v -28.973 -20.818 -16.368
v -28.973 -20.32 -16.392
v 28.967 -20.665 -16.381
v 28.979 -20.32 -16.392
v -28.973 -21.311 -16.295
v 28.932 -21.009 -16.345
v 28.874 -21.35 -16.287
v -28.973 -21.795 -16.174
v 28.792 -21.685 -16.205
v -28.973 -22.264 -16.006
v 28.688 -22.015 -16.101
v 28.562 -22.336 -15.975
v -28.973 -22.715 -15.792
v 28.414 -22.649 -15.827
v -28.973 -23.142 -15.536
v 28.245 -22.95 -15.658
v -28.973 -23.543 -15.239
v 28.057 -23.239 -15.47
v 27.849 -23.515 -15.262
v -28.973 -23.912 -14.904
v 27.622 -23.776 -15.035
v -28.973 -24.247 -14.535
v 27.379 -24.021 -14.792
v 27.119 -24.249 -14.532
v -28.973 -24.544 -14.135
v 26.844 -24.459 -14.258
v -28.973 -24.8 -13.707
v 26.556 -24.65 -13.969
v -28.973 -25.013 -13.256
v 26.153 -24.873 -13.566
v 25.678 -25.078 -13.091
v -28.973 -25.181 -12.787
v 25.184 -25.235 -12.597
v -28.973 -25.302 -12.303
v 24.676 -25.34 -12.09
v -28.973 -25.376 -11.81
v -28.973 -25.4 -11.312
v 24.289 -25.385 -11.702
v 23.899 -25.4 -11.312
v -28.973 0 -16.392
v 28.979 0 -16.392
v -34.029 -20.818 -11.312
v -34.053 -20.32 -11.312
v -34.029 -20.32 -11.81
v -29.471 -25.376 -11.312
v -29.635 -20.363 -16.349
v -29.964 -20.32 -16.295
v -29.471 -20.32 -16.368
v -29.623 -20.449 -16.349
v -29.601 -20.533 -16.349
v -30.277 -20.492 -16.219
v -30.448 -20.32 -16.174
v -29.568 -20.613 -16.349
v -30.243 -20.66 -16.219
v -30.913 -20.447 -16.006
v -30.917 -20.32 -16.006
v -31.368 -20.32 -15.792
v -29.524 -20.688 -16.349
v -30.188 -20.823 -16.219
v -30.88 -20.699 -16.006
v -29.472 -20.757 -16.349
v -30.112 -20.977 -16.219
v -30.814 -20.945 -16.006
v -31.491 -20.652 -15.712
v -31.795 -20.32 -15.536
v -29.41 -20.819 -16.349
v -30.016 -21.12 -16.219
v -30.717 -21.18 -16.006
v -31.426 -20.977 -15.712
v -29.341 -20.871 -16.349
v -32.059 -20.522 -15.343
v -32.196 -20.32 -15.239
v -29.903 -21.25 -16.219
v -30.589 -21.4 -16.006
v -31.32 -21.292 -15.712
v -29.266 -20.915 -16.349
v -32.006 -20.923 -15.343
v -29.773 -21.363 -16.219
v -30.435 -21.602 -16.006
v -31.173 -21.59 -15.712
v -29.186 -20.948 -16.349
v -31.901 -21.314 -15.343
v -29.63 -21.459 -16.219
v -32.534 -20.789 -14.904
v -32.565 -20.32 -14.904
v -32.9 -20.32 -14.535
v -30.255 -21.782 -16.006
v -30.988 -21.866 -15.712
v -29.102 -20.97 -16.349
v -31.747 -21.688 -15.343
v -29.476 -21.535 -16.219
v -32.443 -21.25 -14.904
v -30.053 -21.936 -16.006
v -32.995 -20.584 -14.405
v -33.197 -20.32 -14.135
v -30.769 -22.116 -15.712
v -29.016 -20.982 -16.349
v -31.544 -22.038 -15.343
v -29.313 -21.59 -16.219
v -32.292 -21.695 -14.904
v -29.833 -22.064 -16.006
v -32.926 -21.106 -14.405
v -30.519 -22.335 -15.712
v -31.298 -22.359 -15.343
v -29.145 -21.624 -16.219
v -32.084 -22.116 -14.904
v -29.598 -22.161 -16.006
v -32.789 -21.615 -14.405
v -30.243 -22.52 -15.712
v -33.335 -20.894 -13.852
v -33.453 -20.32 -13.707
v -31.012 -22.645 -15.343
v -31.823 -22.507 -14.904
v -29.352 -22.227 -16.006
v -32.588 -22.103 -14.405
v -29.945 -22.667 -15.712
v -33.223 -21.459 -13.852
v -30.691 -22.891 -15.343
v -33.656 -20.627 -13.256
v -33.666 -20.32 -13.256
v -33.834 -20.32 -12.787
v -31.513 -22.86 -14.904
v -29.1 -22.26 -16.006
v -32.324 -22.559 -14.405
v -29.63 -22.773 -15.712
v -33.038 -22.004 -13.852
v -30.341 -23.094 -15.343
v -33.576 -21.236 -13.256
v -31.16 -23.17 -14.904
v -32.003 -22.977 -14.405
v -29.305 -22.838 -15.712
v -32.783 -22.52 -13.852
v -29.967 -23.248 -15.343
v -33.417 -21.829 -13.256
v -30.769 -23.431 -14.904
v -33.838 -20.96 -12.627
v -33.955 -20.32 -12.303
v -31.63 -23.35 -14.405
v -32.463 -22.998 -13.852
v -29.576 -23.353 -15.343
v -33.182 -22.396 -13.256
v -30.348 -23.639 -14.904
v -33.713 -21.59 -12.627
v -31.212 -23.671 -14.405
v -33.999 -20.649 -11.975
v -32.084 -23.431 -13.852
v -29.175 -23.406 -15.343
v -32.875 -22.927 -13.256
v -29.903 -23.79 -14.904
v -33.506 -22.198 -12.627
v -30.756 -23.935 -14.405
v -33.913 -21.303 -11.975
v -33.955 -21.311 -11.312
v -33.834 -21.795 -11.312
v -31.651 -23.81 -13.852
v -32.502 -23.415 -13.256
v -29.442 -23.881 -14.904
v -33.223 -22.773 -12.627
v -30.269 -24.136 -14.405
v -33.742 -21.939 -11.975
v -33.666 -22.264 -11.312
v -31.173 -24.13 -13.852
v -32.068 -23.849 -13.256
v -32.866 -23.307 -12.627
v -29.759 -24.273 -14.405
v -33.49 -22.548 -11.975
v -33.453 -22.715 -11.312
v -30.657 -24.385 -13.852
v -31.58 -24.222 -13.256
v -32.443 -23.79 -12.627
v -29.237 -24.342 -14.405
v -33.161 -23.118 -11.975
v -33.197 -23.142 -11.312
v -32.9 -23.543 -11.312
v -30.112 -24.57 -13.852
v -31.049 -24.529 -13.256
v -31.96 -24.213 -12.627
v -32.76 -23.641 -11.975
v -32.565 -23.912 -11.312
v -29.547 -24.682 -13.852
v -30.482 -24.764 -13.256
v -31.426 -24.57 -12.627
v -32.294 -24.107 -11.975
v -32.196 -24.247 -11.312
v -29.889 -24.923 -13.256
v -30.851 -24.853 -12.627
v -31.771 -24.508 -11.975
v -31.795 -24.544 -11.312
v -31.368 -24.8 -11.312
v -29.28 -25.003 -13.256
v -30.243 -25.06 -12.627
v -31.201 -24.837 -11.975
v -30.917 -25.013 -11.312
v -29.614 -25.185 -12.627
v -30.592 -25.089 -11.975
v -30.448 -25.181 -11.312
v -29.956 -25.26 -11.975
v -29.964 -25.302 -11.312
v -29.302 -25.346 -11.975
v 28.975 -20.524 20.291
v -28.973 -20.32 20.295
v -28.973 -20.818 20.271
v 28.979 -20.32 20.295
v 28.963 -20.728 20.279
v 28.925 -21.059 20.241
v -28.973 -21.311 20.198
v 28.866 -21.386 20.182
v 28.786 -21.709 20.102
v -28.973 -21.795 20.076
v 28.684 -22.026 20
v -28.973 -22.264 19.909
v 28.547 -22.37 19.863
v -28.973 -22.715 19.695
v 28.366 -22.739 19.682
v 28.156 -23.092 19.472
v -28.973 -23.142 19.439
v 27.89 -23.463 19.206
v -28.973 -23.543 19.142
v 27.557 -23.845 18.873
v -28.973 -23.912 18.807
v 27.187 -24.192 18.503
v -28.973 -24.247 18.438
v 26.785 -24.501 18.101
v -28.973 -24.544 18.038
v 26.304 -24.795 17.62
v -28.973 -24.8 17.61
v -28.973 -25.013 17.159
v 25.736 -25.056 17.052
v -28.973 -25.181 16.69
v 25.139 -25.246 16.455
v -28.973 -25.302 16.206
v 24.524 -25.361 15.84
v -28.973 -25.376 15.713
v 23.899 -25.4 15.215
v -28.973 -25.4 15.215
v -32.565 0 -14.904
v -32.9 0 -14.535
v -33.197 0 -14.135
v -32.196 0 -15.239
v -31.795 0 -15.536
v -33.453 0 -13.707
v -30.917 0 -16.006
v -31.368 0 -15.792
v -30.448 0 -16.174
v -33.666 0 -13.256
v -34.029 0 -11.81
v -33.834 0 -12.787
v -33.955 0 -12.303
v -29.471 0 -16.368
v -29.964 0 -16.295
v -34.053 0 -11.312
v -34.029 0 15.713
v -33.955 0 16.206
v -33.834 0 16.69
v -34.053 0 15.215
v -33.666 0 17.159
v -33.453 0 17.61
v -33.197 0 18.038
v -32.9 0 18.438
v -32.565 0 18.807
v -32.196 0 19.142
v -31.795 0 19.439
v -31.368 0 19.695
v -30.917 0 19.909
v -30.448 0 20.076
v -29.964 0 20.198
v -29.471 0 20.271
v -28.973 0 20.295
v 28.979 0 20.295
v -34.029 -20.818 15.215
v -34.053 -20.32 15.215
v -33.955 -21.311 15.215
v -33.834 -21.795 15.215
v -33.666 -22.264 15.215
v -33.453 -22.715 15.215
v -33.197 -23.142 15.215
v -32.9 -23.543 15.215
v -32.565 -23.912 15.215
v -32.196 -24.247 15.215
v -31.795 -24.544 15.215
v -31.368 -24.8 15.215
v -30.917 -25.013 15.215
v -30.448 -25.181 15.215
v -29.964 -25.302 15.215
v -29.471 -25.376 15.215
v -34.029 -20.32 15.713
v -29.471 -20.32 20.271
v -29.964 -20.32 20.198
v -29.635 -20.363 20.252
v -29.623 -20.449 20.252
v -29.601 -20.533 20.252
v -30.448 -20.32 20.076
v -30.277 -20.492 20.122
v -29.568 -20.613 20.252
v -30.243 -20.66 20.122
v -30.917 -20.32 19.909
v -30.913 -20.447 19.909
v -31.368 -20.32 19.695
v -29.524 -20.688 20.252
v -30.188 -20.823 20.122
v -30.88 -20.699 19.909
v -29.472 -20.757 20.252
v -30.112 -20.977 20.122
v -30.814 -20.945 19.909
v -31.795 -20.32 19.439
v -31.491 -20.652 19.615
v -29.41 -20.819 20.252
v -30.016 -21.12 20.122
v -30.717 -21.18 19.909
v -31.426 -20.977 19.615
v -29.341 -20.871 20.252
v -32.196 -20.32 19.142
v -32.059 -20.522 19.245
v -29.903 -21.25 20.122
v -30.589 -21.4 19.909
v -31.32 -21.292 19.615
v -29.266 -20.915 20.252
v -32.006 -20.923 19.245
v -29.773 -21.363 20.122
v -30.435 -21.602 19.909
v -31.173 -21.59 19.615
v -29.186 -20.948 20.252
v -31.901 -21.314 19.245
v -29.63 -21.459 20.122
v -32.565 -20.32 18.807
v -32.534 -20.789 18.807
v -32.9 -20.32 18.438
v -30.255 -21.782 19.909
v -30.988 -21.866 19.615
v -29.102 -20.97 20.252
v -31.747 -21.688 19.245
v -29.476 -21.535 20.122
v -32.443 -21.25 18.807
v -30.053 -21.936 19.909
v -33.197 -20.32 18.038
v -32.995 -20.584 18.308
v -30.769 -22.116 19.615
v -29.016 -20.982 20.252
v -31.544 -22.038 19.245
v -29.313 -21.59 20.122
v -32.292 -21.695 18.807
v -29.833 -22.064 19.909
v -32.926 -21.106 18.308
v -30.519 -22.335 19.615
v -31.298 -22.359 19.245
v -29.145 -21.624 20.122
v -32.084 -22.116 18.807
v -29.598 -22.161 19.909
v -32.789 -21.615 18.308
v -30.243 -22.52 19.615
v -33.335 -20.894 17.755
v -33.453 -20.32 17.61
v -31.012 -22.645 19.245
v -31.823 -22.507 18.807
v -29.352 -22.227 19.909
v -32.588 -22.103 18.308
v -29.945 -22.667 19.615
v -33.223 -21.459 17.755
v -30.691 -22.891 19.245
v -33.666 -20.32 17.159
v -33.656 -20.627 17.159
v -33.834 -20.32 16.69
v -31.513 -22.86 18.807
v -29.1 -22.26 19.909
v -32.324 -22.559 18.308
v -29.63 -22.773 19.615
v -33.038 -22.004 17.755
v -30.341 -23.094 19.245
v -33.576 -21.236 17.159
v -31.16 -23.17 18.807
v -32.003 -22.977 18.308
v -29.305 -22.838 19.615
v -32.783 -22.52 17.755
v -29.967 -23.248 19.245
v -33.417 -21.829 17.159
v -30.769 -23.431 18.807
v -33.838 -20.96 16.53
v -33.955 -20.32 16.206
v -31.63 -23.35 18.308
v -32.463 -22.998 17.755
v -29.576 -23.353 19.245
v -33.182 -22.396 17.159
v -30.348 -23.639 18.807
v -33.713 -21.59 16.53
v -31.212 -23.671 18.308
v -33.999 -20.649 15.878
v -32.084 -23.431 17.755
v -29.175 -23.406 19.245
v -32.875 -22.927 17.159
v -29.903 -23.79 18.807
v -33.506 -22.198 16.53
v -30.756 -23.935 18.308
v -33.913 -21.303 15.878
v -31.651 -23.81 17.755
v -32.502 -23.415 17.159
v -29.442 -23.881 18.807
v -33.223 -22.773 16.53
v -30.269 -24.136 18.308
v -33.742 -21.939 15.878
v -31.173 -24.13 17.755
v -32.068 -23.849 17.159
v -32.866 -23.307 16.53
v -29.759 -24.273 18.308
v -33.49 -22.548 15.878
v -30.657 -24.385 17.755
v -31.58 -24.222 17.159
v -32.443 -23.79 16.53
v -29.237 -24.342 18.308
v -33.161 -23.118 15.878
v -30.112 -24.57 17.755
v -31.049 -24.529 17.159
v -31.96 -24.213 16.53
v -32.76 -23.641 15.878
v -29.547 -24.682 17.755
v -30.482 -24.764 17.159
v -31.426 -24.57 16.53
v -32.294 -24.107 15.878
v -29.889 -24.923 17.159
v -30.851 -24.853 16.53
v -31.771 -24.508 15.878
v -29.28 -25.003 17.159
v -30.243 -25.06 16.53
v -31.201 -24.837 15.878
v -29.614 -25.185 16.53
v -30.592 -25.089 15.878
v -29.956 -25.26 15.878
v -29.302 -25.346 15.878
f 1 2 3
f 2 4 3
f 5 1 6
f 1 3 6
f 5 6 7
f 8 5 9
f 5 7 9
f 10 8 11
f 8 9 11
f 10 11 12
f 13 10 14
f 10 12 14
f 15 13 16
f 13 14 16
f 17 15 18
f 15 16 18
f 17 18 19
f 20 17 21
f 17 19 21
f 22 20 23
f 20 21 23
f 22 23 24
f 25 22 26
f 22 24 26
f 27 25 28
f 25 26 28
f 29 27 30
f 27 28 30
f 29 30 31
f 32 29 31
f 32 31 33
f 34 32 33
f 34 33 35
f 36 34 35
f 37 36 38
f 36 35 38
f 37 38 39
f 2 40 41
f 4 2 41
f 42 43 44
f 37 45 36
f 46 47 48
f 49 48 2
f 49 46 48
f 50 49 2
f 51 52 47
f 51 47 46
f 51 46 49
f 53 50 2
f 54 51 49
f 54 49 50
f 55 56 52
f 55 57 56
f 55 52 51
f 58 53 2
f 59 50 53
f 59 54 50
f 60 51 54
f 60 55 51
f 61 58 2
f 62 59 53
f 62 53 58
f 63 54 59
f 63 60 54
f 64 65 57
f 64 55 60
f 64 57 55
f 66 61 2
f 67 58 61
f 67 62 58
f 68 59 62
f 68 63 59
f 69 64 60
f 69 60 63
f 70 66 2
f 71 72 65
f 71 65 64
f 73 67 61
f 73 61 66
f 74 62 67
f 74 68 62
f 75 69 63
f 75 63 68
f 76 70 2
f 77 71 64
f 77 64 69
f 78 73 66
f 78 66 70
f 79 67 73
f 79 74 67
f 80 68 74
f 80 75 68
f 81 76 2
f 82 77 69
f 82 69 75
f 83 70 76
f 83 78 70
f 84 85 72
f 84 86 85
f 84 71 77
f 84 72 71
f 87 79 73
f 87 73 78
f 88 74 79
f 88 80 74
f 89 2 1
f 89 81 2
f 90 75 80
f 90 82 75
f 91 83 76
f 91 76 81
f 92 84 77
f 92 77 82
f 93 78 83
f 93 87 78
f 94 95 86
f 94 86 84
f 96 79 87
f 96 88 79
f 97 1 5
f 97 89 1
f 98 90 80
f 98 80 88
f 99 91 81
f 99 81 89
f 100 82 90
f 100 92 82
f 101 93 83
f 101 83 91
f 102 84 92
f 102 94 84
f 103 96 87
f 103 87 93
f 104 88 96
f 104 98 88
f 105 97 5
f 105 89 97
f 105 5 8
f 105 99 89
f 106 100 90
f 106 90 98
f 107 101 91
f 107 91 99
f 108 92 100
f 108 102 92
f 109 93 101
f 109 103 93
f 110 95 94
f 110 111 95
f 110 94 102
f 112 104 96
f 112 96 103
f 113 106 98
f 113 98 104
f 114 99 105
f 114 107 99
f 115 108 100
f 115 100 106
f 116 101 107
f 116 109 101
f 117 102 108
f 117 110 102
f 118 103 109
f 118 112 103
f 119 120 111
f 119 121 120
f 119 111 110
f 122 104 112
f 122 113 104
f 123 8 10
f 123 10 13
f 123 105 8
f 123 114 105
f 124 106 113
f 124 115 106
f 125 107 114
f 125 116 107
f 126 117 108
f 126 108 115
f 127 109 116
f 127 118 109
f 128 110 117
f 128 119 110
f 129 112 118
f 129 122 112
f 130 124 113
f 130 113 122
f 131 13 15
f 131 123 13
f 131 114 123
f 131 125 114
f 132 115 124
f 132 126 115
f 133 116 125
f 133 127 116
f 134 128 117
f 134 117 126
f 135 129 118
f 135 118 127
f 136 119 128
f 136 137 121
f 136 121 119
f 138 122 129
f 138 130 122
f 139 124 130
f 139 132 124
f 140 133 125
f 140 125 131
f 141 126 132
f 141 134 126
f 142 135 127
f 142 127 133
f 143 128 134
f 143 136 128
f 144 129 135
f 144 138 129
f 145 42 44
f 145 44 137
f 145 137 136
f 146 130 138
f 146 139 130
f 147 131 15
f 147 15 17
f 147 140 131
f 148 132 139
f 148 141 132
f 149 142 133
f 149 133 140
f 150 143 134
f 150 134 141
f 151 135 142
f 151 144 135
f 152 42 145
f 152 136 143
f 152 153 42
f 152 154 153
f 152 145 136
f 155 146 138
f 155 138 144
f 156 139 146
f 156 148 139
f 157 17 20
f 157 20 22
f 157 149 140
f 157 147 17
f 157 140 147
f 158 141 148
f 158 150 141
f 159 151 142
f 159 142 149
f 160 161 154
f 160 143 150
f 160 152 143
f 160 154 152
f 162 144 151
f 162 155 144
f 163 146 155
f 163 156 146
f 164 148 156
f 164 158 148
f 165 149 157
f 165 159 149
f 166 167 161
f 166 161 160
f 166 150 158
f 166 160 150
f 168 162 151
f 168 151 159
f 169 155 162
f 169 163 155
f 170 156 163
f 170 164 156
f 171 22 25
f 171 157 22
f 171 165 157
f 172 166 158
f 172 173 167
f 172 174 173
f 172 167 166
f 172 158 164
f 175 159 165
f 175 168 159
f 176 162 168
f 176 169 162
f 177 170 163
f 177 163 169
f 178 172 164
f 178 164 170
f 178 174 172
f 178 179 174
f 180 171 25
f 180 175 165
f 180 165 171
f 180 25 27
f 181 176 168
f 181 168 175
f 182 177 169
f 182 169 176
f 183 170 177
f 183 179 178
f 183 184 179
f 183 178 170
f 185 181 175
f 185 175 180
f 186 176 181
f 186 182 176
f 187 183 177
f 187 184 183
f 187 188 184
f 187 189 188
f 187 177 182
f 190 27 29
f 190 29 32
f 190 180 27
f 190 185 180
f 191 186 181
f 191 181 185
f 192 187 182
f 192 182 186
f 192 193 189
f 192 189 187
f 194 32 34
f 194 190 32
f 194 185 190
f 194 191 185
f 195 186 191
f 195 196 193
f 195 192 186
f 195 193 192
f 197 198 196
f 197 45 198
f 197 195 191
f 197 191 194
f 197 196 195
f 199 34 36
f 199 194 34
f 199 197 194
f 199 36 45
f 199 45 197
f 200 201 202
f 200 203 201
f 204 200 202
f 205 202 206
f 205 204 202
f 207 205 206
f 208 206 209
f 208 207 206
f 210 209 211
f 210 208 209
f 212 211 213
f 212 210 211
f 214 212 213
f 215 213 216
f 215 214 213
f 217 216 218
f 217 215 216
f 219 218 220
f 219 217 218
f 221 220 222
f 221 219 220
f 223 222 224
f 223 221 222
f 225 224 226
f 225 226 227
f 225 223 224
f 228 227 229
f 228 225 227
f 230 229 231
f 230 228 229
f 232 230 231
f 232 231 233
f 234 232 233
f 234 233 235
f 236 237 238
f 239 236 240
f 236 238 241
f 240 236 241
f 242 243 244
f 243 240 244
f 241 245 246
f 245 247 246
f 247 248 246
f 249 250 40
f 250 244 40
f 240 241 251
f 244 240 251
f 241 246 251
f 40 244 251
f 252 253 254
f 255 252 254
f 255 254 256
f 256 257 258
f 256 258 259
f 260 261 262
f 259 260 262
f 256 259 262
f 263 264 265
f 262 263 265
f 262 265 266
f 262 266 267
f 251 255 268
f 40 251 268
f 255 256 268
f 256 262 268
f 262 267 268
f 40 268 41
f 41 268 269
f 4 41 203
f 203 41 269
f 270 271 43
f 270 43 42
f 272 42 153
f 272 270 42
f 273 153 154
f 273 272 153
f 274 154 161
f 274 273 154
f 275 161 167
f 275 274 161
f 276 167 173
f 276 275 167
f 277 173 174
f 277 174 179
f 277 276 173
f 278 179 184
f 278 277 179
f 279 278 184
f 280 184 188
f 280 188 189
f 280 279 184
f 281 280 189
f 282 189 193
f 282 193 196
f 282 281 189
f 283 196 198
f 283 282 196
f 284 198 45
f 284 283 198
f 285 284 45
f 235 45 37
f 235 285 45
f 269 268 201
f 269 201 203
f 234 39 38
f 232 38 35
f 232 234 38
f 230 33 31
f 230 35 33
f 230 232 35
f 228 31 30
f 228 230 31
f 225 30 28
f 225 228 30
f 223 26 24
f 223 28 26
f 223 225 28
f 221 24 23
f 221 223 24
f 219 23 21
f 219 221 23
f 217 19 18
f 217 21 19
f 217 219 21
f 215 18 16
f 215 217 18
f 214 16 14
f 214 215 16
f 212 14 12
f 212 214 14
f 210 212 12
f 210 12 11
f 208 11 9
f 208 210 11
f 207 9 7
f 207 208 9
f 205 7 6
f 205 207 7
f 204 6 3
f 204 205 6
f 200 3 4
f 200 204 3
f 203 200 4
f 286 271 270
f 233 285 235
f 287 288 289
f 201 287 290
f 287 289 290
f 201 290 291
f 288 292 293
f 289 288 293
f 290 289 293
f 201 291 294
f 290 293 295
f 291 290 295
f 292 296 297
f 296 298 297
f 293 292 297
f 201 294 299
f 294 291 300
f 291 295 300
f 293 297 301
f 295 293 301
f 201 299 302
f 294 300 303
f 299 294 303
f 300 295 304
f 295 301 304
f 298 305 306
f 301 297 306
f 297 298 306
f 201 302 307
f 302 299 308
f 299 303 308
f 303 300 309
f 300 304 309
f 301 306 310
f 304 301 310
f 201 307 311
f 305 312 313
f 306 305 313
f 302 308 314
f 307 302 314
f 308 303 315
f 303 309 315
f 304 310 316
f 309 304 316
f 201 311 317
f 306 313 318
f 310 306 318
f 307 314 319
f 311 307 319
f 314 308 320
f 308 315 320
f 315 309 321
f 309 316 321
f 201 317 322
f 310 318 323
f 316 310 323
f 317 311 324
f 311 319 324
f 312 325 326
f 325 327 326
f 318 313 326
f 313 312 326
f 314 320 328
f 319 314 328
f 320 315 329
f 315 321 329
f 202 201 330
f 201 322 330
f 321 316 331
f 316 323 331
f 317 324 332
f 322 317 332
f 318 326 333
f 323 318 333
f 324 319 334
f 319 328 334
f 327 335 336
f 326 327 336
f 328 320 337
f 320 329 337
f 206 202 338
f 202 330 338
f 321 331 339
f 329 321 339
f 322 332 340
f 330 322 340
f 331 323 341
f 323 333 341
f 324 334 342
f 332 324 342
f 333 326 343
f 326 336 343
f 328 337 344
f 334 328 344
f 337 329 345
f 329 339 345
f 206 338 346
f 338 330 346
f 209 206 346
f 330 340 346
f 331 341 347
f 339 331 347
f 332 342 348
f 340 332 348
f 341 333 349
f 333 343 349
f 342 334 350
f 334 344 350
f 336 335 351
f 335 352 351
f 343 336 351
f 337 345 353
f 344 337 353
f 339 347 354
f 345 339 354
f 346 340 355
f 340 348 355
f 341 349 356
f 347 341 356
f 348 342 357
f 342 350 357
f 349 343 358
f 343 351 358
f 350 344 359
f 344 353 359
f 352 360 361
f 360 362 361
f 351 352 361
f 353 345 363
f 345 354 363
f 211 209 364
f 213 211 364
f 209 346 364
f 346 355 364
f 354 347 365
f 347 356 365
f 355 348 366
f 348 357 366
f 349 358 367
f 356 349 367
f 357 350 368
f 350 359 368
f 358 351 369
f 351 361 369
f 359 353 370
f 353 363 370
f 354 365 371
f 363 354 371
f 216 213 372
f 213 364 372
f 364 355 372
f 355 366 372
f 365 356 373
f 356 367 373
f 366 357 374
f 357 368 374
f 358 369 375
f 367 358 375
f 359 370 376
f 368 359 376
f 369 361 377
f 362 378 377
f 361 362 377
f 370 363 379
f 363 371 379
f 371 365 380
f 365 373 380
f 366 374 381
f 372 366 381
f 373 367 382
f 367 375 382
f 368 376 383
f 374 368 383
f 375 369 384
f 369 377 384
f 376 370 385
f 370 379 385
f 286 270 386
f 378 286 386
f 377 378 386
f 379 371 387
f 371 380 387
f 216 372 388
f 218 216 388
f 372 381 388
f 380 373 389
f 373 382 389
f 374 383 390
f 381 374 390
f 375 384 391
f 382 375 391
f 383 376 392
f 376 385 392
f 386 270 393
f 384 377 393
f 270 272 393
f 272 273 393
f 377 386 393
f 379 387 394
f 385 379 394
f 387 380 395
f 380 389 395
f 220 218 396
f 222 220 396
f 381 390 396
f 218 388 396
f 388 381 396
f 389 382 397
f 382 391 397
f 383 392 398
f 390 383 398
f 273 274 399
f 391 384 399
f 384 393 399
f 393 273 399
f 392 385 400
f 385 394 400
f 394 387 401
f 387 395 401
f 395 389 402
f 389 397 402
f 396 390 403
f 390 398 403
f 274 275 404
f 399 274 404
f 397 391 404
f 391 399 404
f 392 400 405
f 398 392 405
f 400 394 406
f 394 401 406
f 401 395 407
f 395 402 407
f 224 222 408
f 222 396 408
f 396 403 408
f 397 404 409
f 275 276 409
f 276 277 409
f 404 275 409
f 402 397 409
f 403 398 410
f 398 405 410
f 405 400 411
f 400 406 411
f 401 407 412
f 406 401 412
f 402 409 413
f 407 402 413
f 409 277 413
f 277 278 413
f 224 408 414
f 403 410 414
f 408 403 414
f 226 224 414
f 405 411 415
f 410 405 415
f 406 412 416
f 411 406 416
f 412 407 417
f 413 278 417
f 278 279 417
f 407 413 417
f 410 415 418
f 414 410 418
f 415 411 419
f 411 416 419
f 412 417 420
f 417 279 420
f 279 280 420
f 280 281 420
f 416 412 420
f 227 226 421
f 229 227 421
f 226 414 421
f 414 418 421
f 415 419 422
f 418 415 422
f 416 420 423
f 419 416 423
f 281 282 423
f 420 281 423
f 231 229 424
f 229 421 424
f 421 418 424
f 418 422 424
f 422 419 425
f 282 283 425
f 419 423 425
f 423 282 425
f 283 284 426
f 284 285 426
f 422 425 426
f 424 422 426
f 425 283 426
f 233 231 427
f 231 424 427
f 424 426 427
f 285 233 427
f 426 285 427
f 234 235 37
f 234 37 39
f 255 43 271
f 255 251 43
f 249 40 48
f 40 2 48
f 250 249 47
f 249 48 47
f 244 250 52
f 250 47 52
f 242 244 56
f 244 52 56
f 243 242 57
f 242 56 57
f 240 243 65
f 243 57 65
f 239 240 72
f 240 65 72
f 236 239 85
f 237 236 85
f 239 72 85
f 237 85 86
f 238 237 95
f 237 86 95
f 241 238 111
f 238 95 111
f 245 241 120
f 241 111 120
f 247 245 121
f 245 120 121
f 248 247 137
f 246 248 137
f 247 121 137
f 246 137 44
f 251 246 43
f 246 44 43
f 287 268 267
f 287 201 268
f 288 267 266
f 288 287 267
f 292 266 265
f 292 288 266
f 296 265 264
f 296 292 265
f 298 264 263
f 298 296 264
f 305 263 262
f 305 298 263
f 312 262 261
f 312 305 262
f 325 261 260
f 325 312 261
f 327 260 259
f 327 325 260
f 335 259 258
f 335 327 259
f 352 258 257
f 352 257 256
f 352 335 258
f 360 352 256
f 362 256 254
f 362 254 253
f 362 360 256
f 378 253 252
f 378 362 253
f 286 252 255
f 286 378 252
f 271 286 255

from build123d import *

# Parameters (mm, degrees)
F0_W     = 63.032269
F0_H     = 36.687511
F1_DEPTH = 25.4
F2_R     = 5.08
F3_R     = 5.08


with BuildPart() as f1:
    # F0 (on Front) → F1 (new body)
    with BuildSketch(Plane.XZ):
        with Locations((-2.536901, 1.951464)):
            Rectangle(F0_W, F0_H)
    extrude(amount=F1_DEPTH)

    # F2
    f2_edges = [f1.edges().sort_by_distance(p)[0] for p in [
        (-34.053035, -25.4, 1.951464),
    ]]
    fillet(f2_edges, radius=F2_R)

    # F3
    f3_edges = [f1.edges().sort_by_distance(p)[0] for p in [
        (0.0031, -25.4, -16.392292),
        (28.979234, -25.4, 1.951464),
        (0.0031, -25.4, 20.295219),
    ]]
    fillet(f3_edges, radius=F3_R)


solid = f1.part
